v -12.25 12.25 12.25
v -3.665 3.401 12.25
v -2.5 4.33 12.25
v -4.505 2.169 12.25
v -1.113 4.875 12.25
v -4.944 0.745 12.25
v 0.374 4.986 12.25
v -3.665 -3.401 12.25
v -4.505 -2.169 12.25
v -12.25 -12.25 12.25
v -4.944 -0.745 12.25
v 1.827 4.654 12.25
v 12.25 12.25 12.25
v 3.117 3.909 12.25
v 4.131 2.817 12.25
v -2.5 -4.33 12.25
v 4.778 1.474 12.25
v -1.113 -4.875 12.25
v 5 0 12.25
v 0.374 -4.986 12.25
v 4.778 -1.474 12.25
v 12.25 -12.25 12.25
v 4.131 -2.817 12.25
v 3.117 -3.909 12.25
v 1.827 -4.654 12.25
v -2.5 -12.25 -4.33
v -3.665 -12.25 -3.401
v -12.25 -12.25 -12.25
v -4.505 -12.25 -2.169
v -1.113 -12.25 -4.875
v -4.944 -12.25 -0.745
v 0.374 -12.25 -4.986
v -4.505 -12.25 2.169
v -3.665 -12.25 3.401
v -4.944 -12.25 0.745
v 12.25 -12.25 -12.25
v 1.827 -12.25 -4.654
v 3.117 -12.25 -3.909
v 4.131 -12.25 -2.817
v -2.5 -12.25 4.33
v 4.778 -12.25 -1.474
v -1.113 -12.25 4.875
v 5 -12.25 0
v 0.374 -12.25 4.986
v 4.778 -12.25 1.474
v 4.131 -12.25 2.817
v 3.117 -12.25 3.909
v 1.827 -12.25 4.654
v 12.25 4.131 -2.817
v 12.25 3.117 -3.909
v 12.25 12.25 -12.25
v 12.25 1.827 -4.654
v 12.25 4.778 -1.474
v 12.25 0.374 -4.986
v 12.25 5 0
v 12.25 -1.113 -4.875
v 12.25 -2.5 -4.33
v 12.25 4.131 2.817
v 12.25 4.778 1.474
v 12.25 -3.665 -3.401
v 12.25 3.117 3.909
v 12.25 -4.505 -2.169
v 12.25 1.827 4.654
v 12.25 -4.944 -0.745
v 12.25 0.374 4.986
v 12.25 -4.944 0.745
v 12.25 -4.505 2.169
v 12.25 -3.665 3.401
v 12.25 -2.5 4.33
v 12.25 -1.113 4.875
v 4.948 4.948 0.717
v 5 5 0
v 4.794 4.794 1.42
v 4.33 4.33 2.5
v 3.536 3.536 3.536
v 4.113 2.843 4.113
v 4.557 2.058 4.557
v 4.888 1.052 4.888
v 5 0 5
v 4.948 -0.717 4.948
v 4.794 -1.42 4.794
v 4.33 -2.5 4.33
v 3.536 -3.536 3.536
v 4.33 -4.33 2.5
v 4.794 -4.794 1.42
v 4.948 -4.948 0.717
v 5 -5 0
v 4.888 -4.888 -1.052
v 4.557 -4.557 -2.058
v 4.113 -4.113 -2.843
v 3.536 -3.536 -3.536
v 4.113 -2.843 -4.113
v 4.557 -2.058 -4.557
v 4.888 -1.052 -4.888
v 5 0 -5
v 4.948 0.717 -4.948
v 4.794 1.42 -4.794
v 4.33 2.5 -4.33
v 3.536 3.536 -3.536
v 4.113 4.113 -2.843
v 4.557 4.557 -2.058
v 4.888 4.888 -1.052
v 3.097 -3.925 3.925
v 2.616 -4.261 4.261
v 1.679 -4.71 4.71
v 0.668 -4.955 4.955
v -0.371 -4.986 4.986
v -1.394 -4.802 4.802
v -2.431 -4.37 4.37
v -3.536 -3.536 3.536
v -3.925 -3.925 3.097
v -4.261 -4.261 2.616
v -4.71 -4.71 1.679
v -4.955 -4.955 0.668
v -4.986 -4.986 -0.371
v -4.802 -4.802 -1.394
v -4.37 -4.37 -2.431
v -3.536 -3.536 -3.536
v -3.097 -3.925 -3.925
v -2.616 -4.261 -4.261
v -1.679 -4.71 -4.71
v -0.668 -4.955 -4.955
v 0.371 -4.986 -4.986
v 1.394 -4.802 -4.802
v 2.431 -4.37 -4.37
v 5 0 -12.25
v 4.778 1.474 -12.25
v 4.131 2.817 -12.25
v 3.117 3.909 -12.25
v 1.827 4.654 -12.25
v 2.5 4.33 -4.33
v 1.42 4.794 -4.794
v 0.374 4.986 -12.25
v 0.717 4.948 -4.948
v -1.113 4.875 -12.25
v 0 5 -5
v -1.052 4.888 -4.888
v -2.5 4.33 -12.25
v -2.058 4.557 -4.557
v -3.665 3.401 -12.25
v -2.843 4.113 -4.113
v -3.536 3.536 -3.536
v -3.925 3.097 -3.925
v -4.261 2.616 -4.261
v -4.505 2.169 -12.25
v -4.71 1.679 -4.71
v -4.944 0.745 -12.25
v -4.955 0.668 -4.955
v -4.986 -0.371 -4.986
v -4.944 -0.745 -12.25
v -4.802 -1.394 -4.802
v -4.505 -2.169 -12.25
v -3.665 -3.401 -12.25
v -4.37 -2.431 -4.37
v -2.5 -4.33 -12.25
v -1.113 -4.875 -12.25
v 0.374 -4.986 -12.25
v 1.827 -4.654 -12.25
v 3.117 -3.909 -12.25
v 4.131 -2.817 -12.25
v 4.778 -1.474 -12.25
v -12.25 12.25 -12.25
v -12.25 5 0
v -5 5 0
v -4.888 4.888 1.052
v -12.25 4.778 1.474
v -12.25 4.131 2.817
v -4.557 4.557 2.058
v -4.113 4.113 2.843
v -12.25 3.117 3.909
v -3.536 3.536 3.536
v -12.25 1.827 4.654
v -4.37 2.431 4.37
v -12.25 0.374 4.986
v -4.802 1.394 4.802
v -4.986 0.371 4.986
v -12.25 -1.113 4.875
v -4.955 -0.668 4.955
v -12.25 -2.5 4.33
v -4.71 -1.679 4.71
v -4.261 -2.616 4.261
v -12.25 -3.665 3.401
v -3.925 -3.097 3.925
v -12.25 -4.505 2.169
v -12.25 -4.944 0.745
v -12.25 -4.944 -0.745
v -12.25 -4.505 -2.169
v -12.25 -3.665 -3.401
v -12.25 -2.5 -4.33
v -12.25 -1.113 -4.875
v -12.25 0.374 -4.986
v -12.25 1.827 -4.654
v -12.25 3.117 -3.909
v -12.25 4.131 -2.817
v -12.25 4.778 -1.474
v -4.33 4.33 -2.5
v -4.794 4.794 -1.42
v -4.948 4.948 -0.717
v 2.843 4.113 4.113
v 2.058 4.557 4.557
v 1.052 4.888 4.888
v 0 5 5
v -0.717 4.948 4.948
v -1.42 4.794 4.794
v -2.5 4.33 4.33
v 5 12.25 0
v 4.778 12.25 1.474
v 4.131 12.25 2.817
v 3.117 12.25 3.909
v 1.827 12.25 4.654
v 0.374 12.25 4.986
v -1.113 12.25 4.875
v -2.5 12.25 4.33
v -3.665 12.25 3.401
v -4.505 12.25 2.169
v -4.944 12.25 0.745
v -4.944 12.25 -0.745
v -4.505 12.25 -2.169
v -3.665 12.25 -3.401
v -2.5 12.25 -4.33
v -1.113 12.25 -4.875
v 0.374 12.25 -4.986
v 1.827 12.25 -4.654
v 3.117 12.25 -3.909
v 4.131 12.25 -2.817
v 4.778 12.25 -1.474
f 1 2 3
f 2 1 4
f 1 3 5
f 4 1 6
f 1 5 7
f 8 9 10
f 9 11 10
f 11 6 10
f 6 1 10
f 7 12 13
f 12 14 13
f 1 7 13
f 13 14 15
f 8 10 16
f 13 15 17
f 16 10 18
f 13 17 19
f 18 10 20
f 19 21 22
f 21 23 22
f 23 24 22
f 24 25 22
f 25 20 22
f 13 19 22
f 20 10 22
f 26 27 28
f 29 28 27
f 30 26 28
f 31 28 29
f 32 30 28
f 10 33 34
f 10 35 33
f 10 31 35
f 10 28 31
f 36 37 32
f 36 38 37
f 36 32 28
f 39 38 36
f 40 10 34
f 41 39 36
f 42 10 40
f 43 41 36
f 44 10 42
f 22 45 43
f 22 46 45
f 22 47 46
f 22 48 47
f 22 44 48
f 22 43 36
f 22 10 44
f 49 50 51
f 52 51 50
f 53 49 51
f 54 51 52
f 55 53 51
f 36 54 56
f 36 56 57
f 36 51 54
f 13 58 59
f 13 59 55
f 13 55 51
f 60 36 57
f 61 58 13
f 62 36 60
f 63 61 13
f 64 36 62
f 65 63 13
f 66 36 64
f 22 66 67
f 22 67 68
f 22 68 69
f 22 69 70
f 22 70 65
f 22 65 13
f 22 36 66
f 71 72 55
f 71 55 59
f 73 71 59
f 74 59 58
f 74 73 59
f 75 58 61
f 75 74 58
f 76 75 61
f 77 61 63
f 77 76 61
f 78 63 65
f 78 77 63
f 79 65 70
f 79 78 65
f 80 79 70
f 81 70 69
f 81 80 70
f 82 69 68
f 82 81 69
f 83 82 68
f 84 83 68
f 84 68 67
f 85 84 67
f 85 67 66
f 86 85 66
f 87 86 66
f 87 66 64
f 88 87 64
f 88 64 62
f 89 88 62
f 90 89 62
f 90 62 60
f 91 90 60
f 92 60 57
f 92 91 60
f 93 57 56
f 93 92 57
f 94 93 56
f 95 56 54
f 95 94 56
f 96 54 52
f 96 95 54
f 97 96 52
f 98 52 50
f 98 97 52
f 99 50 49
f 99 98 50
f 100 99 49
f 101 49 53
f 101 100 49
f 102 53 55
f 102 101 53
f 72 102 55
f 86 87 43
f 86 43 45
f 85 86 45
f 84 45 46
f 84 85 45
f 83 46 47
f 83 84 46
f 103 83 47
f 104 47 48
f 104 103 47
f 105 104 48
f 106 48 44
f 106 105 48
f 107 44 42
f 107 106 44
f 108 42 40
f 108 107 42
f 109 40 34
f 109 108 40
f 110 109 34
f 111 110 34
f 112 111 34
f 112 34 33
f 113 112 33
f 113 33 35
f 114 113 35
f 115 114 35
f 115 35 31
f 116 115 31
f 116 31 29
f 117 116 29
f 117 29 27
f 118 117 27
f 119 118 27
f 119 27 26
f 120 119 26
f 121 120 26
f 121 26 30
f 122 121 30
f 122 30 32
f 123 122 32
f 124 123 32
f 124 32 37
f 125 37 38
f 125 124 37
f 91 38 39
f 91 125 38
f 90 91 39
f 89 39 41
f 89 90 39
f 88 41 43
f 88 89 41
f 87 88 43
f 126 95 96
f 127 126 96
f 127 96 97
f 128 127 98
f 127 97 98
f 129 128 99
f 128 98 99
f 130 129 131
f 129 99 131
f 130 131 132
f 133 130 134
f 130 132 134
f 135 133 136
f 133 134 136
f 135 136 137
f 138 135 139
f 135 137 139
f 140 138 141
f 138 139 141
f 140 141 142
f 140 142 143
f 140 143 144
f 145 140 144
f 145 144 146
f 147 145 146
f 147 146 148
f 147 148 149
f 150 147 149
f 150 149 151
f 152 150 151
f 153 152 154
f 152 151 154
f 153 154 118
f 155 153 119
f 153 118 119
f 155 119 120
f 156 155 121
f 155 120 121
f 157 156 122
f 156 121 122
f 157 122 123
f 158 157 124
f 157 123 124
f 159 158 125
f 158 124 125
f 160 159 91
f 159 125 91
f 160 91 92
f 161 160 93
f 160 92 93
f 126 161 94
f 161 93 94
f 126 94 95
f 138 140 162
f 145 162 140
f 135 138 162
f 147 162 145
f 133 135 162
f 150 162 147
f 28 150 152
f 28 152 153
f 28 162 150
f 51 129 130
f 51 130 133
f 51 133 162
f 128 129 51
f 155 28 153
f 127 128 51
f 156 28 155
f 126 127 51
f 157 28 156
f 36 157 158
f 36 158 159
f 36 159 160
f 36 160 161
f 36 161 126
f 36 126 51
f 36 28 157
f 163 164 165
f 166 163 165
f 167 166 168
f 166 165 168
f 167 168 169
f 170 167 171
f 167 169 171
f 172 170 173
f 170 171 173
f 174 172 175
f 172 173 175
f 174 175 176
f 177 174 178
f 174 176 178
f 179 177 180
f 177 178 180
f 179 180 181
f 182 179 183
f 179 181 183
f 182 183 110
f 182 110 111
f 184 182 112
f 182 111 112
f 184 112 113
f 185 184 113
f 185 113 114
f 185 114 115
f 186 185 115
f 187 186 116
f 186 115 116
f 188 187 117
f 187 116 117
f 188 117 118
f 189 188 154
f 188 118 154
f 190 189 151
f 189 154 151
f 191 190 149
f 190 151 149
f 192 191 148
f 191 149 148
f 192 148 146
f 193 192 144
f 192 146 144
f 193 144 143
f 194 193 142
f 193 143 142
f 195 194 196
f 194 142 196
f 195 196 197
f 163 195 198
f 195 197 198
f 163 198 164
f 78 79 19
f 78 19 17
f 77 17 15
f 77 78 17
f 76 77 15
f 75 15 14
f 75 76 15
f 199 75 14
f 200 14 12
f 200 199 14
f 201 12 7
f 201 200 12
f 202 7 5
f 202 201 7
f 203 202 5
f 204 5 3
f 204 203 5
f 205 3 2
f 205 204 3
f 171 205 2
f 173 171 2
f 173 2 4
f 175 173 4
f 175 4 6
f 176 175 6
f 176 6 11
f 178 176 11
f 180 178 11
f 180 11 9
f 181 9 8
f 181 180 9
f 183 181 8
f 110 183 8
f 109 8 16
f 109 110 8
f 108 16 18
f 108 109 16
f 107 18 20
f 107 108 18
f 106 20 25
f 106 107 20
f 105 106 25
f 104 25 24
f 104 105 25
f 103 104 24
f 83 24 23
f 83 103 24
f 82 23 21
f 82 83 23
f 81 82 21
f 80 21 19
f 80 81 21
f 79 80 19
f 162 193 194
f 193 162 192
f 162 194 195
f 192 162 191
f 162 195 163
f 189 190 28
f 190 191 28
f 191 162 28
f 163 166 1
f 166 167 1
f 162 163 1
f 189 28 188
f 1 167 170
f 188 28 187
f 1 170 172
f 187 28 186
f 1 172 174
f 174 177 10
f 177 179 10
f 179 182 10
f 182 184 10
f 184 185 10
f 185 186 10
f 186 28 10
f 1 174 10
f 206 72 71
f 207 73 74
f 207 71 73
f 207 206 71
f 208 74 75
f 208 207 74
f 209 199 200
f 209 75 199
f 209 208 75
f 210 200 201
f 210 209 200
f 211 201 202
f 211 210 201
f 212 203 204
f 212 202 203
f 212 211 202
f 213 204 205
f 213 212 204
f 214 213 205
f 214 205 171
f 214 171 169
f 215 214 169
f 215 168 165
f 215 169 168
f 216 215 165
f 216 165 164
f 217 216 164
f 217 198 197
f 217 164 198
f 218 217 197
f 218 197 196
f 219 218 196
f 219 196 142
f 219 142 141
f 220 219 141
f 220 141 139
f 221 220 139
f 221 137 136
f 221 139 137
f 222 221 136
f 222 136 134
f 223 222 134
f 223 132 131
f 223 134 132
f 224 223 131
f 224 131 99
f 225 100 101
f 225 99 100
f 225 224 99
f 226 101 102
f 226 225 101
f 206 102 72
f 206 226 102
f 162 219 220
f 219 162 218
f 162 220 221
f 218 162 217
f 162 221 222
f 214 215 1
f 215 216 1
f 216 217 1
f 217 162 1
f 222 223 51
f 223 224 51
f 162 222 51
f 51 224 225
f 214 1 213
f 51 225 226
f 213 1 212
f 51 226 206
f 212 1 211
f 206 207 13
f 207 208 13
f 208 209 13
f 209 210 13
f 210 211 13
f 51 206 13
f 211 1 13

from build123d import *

# Parameters (mm, degrees)
F0_W          = 24.5
F0_H          = 24.5
F0_R          = 5
F1_DEPTH      = 12.25
F2_R          = 5
F3_DEPTH      = 12.251
F3_DEPTH_BACK = 12.251
F4_R          = 5
F5_DEPTH      = 12.251
F5_DEPTH_BACK = 12.251


with BuildPart() as f1:
    # F0 (on Front) → F1 (new body, symmetric)
    with BuildSketch(Plane.XZ):
        Rectangle(F0_W, F0_H)
        Circle(F0_R, mode=Mode.SUBTRACT)
    extrude(amount=F1_DEPTH, both=True)

    # F2 (on Right) → F3 (cut, two sides)
    with BuildSketch(Plane.YZ) as f3_sk:
        Circle(F2_R)
    extrude(amount=-F3_DEPTH, mode=Mode.SUBTRACT)
    extrude(f3_sk.sketch, amount=F3_DEPTH_BACK, mode=Mode.SUBTRACT)

    # F4 (on Top) → F5 (cut, two sides)
    with BuildSketch(Plane.XY) as f5_sk:
        Circle(F4_R)
    extrude(amount=-F5_DEPTH, mode=Mode.SUBTRACT)
    extrude(f5_sk.sketch, amount=F5_DEPTH_BACK, mode=Mode.SUBTRACT)


solid = f1.part
